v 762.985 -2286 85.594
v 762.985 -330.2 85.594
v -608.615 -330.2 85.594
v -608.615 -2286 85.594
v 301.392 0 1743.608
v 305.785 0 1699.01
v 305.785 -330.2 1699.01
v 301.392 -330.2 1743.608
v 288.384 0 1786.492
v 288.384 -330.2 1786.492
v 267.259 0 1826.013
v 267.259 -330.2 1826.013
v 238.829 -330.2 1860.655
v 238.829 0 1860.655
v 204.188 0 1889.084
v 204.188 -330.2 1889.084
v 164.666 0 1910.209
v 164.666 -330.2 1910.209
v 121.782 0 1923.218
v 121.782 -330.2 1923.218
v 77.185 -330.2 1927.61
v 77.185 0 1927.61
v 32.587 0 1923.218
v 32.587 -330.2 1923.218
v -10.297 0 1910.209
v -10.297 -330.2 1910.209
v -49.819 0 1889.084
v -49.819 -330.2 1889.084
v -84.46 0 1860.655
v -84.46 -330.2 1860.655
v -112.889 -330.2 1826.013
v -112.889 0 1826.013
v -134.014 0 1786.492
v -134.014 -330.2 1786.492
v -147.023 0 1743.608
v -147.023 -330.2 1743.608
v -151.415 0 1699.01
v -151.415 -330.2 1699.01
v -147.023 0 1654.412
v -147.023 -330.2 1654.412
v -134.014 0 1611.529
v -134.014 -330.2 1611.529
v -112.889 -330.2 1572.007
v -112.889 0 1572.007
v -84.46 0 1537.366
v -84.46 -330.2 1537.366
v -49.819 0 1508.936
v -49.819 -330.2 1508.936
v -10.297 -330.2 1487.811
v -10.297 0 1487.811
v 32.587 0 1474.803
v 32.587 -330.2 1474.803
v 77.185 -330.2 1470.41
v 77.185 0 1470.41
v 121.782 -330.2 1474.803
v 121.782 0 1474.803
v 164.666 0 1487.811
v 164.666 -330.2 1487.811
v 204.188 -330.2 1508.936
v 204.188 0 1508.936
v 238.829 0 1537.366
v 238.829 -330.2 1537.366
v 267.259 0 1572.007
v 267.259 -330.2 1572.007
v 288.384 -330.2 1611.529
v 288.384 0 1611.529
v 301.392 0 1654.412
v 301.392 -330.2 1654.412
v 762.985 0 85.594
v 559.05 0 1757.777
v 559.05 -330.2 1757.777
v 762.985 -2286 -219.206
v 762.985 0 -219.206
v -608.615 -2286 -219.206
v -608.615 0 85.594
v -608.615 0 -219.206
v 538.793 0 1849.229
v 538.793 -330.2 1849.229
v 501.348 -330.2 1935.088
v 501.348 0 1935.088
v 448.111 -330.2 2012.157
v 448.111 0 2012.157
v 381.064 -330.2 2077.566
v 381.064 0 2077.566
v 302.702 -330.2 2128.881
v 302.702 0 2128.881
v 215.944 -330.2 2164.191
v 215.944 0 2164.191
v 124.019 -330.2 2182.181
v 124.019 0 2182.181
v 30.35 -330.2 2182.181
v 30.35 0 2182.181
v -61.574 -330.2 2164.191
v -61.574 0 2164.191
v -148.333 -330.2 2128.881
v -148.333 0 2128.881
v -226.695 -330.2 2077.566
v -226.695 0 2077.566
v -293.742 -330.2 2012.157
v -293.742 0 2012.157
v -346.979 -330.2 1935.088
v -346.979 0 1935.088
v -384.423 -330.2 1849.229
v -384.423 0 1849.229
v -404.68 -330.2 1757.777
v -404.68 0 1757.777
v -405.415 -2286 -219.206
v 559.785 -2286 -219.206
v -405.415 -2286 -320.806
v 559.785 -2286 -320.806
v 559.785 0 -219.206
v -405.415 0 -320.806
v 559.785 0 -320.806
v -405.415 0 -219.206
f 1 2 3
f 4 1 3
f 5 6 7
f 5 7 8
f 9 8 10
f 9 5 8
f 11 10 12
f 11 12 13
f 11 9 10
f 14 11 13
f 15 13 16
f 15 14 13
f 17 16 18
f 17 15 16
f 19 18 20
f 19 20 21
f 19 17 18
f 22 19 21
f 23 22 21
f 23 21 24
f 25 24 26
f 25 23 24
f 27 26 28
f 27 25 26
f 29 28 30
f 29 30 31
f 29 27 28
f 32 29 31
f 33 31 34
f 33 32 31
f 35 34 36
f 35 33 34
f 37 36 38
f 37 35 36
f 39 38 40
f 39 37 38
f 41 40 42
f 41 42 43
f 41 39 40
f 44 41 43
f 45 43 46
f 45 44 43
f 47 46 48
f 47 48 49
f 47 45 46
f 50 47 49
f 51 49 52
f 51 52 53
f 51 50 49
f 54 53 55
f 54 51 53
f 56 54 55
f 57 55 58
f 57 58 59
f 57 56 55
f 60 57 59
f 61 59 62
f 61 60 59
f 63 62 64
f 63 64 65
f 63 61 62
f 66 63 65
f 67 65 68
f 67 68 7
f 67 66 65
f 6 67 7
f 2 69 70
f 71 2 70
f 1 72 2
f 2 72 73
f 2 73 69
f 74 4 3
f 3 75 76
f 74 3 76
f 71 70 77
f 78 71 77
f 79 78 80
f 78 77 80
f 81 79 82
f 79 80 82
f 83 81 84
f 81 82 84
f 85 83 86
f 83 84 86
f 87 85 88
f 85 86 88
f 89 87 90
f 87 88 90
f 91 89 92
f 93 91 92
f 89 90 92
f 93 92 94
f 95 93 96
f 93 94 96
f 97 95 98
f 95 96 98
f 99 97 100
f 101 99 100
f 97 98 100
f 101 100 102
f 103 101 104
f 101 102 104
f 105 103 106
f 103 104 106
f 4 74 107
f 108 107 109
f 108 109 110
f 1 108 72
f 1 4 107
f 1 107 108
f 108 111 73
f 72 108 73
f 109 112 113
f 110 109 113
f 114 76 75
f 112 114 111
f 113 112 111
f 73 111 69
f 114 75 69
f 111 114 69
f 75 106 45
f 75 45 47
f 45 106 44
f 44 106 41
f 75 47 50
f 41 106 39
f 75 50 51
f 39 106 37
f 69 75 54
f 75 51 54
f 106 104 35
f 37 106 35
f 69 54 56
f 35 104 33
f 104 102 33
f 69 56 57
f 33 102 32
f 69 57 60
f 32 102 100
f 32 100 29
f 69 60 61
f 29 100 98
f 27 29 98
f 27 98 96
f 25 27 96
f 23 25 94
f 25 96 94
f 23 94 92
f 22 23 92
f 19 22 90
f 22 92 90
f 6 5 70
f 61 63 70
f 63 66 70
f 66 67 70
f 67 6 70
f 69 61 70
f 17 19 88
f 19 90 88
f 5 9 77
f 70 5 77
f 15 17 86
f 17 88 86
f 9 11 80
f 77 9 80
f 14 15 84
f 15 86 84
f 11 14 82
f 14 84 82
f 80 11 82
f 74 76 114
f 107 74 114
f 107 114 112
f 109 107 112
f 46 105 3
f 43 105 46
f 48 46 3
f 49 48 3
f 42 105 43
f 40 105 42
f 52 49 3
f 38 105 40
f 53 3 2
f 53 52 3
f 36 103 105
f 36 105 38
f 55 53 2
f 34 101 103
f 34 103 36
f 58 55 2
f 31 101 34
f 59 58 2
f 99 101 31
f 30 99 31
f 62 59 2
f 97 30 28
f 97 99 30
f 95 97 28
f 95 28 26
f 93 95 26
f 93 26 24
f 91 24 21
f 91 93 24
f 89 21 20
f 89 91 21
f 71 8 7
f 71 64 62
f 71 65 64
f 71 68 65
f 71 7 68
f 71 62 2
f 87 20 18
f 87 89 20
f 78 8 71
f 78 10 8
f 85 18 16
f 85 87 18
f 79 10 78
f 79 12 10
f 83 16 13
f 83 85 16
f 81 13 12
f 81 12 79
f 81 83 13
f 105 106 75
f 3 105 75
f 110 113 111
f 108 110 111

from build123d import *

# Parameters (mm, degrees)
F1_DEPTH = 2286
F0_R     = 228.6
F2_DEPTH = 330.2


with BuildPart() as f1:
    # F0 (on Front) → F1 (new body)
    with BuildSketch(Plane.XZ):
        Polygon((-405.41529, -219.205609), (-405.41529, -320.805609), (559.78471, -320.805609), (559.78471, -219.205609), (762.98471, -219.205609), (762.98471, 85.594391), (-608.61529, 85.594391), (-608.61529, -219.205609), align=None)
    extrude(amount=F1_DEPTH)

    # F0 (on Front) → F2 (join)
    with BuildSketch(Plane.XZ):
        with BuildLine():
            Line((-404.680331, 1757.777113), (-608.61529, 85.594391))
            Line((-608.61529, 85.594391), (762.98471, 85.594391))
            Line((762.98471, 85.594391), (559.049751, 1757.777113))
            ThreePointArc((559.049751, 1757.777113), (77.18471, 2184.44548), (-404.680331, 1757.777113))
        make_face()
        with Locations((77.18471, 1699.010134)):
            Circle(F0_R, mode=Mode.SUBTRACT)
    extrude(amount=F2_DEPTH)


solid = f1.part
